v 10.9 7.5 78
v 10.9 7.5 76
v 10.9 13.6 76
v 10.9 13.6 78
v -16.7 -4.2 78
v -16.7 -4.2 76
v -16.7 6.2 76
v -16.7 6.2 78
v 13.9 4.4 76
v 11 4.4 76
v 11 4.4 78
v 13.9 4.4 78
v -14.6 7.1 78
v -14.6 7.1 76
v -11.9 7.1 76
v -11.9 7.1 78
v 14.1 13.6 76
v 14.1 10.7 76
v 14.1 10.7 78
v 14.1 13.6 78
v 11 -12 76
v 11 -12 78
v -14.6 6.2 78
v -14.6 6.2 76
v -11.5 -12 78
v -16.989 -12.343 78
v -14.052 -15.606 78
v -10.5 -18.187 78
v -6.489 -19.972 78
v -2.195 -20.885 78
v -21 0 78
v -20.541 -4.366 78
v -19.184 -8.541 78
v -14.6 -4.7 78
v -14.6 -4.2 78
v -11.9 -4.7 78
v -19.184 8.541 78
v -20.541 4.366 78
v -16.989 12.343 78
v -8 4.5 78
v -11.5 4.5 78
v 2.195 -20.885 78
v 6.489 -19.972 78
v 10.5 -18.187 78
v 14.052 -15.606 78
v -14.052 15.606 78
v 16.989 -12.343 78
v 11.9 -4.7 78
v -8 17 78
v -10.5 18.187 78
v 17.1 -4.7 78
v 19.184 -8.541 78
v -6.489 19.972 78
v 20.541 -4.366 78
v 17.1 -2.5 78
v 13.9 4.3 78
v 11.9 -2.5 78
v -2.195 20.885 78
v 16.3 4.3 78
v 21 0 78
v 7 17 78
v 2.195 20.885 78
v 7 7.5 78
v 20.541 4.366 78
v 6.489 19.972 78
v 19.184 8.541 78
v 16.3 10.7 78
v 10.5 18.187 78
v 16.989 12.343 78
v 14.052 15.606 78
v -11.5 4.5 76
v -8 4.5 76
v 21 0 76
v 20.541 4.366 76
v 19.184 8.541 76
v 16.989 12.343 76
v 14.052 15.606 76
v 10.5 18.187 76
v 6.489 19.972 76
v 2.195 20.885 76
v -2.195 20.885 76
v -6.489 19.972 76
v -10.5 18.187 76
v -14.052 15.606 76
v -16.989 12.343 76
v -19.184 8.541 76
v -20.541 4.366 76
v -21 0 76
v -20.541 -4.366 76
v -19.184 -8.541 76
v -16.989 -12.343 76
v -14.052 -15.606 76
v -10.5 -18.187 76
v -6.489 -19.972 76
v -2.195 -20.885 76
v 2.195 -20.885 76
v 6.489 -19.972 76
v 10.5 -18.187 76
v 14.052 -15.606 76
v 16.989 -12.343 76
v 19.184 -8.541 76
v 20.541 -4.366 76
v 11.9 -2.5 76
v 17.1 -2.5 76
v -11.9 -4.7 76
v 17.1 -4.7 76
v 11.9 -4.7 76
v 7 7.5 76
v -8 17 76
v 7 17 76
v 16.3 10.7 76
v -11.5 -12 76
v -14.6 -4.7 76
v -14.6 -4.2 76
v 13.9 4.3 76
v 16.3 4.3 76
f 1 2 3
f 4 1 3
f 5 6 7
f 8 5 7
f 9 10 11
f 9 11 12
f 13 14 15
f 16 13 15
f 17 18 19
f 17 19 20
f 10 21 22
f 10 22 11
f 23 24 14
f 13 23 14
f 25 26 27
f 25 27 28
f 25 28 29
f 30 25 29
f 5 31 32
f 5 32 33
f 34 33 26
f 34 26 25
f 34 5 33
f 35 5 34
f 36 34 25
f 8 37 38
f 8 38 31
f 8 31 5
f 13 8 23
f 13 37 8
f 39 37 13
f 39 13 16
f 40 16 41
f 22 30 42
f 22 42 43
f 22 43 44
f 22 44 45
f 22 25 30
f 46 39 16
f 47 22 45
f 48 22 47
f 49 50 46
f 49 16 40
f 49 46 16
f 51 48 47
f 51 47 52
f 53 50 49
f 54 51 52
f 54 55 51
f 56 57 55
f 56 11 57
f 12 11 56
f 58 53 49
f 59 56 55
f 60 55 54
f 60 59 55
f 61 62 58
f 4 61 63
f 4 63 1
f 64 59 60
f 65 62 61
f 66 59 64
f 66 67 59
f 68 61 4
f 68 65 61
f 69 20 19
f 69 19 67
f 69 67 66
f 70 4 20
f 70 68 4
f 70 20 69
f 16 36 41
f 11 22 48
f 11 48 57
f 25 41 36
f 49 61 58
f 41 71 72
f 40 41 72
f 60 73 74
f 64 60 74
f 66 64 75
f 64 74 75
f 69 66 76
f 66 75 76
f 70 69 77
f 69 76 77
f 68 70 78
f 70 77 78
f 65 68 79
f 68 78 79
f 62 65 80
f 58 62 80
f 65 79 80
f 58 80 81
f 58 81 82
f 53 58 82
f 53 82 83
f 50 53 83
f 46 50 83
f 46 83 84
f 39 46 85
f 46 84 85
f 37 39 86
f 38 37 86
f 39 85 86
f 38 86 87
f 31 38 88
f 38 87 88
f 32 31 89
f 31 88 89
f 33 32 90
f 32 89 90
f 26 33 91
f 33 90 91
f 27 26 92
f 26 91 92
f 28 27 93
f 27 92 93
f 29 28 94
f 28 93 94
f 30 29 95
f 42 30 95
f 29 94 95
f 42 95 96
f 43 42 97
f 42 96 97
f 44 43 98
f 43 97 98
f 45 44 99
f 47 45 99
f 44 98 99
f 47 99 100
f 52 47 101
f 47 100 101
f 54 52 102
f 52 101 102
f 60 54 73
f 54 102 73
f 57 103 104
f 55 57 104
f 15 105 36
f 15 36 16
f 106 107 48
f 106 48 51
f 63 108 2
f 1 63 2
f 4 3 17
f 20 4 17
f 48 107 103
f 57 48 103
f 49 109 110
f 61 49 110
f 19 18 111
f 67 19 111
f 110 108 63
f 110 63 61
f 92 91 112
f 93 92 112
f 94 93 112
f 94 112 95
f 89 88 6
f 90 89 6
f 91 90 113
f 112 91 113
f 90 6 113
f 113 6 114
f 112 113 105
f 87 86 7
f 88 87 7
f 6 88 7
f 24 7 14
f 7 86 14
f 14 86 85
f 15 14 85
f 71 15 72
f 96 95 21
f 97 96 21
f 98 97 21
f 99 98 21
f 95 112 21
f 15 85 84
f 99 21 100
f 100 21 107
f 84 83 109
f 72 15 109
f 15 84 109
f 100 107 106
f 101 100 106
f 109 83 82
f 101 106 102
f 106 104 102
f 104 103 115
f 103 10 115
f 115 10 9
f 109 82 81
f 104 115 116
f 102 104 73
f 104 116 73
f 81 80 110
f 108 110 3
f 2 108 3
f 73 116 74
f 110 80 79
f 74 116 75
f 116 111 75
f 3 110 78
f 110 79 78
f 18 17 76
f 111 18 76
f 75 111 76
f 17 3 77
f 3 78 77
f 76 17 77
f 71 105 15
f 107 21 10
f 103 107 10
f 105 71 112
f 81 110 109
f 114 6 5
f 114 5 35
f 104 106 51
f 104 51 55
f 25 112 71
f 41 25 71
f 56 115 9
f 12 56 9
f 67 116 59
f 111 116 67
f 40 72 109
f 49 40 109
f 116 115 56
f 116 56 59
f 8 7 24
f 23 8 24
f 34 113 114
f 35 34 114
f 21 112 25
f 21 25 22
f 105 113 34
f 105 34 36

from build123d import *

# Parameters (mm, degrees)
BOX326_W          = 22.5
BOX326_H          = 16.5
BOX326_DEPTH      = 2
BOX327_W          = 15
BOX327_H          = 12.5
BOX327_DEPTH      = 2
BOX319_W          = 2.4
BOX319_H          = 6.4
BOX319_DEPTH      = 2
BOX349_W          = 3.2
BOX349_H          = 9.2
BOX349_DEPTH      = 2
BOX340_W          = 5.2
BOX340_H          = 2.2
BOX340_DEPTH      = 2
BOX339_W          = 2.7
BOX339_H          = 11.8
BOX339_DEPTH      = 2
BOX338_W          = 4
BOX338_H          = 3
BOX338_DEPTH      = 2
BOX320_W          = 2.2
BOX320_H          = 10.4
BOX320_DEPTH      = 2
CYLINDER405_R     = 21
CYLINDER405_DEPTH = 2


with BuildPart() as box326:
    # Box326 → Box326 (new body)
    with BuildSketch(Plane(origin=(-11.5, -12, 76), x_dir=(1, 0, 0), z_dir=(0, 0, 1))):
        with Locations((11.25, 8.25)):
            Rectangle(BOX326_W, BOX326_H)
    extrude(amount=BOX326_DEPTH)


with BuildPart() as box327:
    # Box327 → Box327 (new body)
    with BuildSketch(Plane(origin=(-8, 4.5, 76), x_dir=(1, 0, 0), z_dir=(0, 0, 1))):
        with Locations((7.5, 6.25)):
            Rectangle(BOX327_W, BOX327_H)
    extrude(amount=BOX327_DEPTH)


with BuildPart() as cut_out_narrow_pole:
    # Box319 → Box319 (new body)
    with BuildSketch(Plane(origin=(13.9, 4.3, 76), x_dir=(1, 0, 0), z_dir=(0, 0, 1))):
        with Locations((1.2, 3.2)):
            Rectangle(BOX319_W, BOX319_H)
    extrude(amount=BOX319_DEPTH)


with BuildPart() as box349:
    # Box349 → Box349 (new body)
    with BuildSketch(Plane(origin=(10.9, 4.4, 76), x_dir=(1, 0, 0), z_dir=(0, 0, 1))):
        with Locations((1.6, 4.6)):
            Rectangle(BOX349_W, BOX349_H)
    extrude(amount=BOX349_DEPTH)


with BuildPart() as box340:
    # Box340 → Box340 (new body)
    with BuildSketch(Plane(origin=(11.9, -4.7, 76), x_dir=(1, 0, 0), z_dir=(0, 0, 1))):
        with Locations((2.6, 1.1)):
            Rectangle(BOX340_W, BOX340_H)
    extrude(amount=BOX340_DEPTH)


with BuildPart() as box339:
    # Box339 → Box339 (new body)
    with BuildSketch(Plane(origin=(-14.6, -4.7, 76), x_dir=(1, 0, 0), z_dir=(0, 0, 1))):
        with Locations((1.35, 5.9)):
            Rectangle(BOX339_W, BOX339_H)
    extrude(amount=BOX339_DEPTH)


with BuildPart() as cut_out_connector_mpu6050:
    # Box338 → Box338 (new body)
    with BuildSketch(Plane(origin=(7, 4.5, 76), x_dir=(1, 0, 0), z_dir=(0, 0, 1))):
        with Locations((2, 1.5)):
            Rectangle(BOX338_W, BOX338_H)
    extrude(amount=BOX338_DEPTH)


with BuildPart() as cut_outs002:
    # Box320 → Box320 (new body)
    with BuildSketch(Plane(origin=(-16.7, -4.2, 76), x_dir=(1, 0, 0), z_dir=(0, 0, 1))):
        with Locations((1.1, 5.2)):
            Rectangle(BOX320_W, BOX320_H)
    extrude(amount=BOX320_DEPTH)

    # Fusion090: union Box326, Box327, Cut-out narrow pole, Box349, Box340, Box339, cut-out connector MPU6050
    add(box326.part)
    add(box327.part)
    add(cut_out_narrow_pole.part)
    add(box349.part)
    add(box340.part)
    add(box339.part)
    add(cut_out_connector_mpu6050.part)


with BuildPart() as baseplate:
    # Cylinder405 → Cylinder405 (new body)
    with BuildSketch(Plane.XY.offset(76)):
        Circle(CYLINDER405_R)
    extrude(amount=CYLINDER405_DEPTH)

    # Cut228: cut cut-outs002
    add(cut_outs002.part, mode=Mode.SUBTRACT)


solid = baseplate.part
